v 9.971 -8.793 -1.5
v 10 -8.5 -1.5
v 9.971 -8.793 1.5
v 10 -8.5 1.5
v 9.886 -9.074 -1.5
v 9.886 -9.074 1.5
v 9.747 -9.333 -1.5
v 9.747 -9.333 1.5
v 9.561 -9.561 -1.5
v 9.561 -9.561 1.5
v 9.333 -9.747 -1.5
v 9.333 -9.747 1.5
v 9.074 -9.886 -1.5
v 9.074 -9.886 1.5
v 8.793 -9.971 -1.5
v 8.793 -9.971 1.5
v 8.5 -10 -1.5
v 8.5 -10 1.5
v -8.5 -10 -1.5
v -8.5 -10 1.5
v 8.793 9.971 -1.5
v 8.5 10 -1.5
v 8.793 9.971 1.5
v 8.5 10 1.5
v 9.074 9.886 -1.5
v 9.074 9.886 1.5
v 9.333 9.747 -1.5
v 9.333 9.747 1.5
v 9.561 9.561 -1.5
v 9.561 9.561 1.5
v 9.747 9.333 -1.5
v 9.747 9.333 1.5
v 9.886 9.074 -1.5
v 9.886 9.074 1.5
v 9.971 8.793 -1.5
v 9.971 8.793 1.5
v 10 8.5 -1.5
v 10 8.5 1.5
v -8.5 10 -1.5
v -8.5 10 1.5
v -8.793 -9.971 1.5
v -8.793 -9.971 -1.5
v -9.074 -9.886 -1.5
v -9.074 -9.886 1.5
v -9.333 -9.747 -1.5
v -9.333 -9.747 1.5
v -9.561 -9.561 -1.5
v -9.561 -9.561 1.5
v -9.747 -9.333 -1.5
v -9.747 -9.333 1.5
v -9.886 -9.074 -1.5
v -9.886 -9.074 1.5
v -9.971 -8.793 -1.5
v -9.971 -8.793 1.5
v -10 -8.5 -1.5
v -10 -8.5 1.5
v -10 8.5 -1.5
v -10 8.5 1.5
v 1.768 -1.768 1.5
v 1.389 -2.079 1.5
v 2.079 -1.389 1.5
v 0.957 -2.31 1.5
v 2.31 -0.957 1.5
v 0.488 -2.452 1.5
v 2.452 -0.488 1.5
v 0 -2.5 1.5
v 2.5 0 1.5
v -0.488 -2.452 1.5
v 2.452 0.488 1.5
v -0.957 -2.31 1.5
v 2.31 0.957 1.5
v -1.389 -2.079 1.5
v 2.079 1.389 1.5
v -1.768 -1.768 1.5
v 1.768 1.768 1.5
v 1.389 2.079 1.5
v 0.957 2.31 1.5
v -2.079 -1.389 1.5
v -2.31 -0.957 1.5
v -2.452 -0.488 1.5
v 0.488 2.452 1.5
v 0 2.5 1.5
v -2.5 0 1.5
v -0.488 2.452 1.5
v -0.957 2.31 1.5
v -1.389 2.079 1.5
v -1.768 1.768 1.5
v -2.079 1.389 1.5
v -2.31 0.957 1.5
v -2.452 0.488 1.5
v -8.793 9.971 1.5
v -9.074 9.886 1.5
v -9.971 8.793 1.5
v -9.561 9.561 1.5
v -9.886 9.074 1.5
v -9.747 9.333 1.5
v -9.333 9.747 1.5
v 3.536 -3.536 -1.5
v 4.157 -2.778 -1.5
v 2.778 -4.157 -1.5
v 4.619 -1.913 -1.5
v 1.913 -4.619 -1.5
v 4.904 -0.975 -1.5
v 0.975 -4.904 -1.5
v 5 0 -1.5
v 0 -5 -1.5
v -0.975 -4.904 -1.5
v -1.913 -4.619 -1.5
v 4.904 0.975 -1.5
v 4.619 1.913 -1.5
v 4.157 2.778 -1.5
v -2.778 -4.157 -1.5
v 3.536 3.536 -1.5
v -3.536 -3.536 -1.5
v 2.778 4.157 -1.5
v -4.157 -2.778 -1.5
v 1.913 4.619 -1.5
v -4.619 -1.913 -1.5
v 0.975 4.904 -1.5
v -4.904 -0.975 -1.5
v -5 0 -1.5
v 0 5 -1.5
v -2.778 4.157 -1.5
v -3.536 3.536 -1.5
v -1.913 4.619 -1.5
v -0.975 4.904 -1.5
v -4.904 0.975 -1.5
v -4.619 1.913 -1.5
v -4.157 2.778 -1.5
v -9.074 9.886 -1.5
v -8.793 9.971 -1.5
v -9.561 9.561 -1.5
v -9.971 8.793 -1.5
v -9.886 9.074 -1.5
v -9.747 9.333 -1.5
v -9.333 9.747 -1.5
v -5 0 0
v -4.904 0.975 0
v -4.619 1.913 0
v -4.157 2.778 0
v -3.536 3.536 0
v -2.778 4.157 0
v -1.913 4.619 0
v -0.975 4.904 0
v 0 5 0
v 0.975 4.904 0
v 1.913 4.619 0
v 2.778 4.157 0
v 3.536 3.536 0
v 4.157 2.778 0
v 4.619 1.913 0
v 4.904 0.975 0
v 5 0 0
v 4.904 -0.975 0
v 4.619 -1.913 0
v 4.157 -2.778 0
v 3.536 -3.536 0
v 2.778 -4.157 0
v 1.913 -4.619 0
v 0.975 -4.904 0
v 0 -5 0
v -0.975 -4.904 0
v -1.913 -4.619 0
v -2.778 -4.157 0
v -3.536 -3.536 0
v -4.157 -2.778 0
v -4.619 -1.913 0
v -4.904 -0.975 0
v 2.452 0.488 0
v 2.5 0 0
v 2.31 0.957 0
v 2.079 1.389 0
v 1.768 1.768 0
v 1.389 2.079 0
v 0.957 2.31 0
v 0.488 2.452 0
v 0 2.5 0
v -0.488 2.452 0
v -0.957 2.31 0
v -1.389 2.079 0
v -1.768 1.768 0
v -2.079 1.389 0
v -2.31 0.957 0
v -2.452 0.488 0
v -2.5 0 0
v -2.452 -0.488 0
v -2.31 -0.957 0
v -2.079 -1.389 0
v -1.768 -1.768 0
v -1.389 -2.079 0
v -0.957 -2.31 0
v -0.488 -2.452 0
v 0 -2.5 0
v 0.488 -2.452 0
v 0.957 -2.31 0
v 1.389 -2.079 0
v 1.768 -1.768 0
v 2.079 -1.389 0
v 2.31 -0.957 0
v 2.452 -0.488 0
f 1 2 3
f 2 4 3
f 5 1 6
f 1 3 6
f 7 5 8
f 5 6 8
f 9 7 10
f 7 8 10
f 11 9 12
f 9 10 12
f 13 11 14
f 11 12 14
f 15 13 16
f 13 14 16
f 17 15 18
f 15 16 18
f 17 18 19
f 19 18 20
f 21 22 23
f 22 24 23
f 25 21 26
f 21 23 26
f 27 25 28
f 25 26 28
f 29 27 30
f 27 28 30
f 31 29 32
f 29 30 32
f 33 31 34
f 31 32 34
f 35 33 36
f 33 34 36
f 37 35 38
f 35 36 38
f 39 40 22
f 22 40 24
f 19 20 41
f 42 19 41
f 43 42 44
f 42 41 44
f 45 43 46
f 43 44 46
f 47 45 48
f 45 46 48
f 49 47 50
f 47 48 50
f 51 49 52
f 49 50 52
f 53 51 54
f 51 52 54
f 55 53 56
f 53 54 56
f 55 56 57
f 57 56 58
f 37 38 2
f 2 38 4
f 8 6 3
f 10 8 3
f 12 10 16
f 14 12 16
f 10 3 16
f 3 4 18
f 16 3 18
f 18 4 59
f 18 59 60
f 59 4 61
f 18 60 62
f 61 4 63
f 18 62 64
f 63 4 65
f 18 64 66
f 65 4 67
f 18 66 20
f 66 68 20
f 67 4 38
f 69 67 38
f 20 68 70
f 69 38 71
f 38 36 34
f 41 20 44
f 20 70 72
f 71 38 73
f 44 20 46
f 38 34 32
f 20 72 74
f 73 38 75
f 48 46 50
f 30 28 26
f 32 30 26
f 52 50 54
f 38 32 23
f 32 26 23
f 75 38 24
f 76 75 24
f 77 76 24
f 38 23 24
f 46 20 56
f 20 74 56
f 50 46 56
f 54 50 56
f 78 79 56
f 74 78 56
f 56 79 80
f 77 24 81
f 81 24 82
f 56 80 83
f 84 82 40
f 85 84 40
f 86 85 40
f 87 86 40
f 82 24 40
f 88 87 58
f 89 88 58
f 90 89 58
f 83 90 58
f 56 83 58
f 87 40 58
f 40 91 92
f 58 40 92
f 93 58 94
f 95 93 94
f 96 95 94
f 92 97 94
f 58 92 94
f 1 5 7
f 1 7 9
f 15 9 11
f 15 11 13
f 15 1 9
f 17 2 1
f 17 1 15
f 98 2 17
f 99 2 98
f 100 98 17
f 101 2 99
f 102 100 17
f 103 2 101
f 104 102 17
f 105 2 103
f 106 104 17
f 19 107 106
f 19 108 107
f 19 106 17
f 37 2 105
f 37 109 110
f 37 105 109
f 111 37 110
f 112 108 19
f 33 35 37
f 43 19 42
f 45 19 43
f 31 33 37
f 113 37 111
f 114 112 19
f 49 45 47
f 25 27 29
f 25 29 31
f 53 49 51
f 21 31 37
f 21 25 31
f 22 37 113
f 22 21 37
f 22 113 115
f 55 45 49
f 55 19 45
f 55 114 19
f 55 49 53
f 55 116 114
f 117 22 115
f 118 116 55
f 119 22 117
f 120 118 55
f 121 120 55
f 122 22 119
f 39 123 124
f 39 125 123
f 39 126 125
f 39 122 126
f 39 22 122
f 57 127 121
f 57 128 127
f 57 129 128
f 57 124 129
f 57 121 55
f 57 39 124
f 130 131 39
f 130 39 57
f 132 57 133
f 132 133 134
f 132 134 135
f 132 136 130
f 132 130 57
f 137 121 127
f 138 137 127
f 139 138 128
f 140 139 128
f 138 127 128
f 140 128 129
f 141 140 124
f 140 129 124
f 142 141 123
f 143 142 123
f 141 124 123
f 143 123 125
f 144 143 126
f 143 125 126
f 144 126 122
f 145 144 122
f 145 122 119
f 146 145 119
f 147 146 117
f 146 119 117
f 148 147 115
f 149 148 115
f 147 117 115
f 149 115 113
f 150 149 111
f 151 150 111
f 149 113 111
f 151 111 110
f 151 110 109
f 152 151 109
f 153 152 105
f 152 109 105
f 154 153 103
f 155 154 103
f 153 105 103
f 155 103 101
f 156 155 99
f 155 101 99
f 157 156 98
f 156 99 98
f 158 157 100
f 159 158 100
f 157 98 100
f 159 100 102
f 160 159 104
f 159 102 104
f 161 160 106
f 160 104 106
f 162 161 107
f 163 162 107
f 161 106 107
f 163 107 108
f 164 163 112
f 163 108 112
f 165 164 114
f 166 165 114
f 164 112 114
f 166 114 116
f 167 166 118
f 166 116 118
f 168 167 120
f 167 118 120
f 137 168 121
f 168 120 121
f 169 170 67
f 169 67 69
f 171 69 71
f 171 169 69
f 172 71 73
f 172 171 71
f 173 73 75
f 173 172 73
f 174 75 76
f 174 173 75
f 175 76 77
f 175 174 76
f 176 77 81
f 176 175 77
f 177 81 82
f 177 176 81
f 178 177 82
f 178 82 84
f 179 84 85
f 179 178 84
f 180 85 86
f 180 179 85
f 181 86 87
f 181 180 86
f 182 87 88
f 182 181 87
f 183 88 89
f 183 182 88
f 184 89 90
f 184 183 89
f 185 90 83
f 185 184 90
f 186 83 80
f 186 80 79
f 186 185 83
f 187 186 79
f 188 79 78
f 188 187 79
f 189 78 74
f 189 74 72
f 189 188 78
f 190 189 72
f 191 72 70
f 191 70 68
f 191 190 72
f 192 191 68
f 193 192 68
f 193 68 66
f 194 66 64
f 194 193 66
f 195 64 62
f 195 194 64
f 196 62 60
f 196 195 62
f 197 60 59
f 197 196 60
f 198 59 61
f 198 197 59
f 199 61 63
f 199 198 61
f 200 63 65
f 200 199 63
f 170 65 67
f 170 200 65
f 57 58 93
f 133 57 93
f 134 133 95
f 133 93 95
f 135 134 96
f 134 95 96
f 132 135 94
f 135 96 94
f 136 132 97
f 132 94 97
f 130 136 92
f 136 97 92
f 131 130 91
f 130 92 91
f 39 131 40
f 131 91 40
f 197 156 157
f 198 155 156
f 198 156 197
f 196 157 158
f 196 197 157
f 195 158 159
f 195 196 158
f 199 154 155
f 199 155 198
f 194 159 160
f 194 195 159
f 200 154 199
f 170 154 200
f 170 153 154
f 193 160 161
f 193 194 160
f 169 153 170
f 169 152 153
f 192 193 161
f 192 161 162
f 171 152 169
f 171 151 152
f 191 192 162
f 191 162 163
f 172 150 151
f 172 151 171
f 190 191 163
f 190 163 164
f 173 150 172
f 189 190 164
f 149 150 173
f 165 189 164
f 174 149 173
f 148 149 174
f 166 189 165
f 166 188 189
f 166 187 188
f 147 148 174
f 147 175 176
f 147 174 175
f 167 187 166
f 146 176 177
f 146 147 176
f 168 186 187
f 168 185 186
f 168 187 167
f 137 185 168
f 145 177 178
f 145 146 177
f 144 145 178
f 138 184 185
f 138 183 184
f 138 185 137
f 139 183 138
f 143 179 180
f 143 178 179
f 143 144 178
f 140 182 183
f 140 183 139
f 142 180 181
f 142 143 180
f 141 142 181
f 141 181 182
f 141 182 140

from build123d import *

# Parameters (mm, degrees)
SKETCH1_R           = 2.5
BOSS_EXTRUDE1_DEPTH = 1.5
SKETCH2_R           = 5
CUT_EXTRUDE1_DEPTH  = 1.5


with BuildPart() as part:
    # Sketch1 → Boss-Extrude1 (new body, symmetric)
    with BuildSketch(Plane.XY):
        with BuildLine():
            Line((-8.5, 10), (8.5, 10))
            ThreePointArc((8.5, 10), (9.560660172, 9.560660172), (10, 8.5))
            Line((10, 8.5), (10, -8.5))
            ThreePointArc((10, -8.5), (9.560660172, -9.560660172), (8.5, -10))
            Line((8.5, -10), (-8.5, -10))
            ThreePointArc((-8.5, -10), (-9.560660172, -9.560660172), (-10, -8.5))
            Line((-10, -8.5), (-10, 8.5))
            ThreePointArc((-10, 8.5), (-9.560660172, 9.560660172), (-8.5, 10))
        make_face()
        Circle(SKETCH1_R, mode=Mode.SUBTRACT)
    extrude(amount=BOSS_EXTRUDE1_DEPTH, both=True)

    # Sketch2 → Cut-Extrude1 (cut)
    with BuildSketch(Plane(origin=(0, 0, -1.5), x_dir=(-1, 0, 0), z_dir=(0, 0, -1))):
        Circle(SKETCH2_R)
    extrude(amount=-CUT_EXTRUDE1_DEPTH, mode=Mode.SUBTRACT)


solid = part.part
